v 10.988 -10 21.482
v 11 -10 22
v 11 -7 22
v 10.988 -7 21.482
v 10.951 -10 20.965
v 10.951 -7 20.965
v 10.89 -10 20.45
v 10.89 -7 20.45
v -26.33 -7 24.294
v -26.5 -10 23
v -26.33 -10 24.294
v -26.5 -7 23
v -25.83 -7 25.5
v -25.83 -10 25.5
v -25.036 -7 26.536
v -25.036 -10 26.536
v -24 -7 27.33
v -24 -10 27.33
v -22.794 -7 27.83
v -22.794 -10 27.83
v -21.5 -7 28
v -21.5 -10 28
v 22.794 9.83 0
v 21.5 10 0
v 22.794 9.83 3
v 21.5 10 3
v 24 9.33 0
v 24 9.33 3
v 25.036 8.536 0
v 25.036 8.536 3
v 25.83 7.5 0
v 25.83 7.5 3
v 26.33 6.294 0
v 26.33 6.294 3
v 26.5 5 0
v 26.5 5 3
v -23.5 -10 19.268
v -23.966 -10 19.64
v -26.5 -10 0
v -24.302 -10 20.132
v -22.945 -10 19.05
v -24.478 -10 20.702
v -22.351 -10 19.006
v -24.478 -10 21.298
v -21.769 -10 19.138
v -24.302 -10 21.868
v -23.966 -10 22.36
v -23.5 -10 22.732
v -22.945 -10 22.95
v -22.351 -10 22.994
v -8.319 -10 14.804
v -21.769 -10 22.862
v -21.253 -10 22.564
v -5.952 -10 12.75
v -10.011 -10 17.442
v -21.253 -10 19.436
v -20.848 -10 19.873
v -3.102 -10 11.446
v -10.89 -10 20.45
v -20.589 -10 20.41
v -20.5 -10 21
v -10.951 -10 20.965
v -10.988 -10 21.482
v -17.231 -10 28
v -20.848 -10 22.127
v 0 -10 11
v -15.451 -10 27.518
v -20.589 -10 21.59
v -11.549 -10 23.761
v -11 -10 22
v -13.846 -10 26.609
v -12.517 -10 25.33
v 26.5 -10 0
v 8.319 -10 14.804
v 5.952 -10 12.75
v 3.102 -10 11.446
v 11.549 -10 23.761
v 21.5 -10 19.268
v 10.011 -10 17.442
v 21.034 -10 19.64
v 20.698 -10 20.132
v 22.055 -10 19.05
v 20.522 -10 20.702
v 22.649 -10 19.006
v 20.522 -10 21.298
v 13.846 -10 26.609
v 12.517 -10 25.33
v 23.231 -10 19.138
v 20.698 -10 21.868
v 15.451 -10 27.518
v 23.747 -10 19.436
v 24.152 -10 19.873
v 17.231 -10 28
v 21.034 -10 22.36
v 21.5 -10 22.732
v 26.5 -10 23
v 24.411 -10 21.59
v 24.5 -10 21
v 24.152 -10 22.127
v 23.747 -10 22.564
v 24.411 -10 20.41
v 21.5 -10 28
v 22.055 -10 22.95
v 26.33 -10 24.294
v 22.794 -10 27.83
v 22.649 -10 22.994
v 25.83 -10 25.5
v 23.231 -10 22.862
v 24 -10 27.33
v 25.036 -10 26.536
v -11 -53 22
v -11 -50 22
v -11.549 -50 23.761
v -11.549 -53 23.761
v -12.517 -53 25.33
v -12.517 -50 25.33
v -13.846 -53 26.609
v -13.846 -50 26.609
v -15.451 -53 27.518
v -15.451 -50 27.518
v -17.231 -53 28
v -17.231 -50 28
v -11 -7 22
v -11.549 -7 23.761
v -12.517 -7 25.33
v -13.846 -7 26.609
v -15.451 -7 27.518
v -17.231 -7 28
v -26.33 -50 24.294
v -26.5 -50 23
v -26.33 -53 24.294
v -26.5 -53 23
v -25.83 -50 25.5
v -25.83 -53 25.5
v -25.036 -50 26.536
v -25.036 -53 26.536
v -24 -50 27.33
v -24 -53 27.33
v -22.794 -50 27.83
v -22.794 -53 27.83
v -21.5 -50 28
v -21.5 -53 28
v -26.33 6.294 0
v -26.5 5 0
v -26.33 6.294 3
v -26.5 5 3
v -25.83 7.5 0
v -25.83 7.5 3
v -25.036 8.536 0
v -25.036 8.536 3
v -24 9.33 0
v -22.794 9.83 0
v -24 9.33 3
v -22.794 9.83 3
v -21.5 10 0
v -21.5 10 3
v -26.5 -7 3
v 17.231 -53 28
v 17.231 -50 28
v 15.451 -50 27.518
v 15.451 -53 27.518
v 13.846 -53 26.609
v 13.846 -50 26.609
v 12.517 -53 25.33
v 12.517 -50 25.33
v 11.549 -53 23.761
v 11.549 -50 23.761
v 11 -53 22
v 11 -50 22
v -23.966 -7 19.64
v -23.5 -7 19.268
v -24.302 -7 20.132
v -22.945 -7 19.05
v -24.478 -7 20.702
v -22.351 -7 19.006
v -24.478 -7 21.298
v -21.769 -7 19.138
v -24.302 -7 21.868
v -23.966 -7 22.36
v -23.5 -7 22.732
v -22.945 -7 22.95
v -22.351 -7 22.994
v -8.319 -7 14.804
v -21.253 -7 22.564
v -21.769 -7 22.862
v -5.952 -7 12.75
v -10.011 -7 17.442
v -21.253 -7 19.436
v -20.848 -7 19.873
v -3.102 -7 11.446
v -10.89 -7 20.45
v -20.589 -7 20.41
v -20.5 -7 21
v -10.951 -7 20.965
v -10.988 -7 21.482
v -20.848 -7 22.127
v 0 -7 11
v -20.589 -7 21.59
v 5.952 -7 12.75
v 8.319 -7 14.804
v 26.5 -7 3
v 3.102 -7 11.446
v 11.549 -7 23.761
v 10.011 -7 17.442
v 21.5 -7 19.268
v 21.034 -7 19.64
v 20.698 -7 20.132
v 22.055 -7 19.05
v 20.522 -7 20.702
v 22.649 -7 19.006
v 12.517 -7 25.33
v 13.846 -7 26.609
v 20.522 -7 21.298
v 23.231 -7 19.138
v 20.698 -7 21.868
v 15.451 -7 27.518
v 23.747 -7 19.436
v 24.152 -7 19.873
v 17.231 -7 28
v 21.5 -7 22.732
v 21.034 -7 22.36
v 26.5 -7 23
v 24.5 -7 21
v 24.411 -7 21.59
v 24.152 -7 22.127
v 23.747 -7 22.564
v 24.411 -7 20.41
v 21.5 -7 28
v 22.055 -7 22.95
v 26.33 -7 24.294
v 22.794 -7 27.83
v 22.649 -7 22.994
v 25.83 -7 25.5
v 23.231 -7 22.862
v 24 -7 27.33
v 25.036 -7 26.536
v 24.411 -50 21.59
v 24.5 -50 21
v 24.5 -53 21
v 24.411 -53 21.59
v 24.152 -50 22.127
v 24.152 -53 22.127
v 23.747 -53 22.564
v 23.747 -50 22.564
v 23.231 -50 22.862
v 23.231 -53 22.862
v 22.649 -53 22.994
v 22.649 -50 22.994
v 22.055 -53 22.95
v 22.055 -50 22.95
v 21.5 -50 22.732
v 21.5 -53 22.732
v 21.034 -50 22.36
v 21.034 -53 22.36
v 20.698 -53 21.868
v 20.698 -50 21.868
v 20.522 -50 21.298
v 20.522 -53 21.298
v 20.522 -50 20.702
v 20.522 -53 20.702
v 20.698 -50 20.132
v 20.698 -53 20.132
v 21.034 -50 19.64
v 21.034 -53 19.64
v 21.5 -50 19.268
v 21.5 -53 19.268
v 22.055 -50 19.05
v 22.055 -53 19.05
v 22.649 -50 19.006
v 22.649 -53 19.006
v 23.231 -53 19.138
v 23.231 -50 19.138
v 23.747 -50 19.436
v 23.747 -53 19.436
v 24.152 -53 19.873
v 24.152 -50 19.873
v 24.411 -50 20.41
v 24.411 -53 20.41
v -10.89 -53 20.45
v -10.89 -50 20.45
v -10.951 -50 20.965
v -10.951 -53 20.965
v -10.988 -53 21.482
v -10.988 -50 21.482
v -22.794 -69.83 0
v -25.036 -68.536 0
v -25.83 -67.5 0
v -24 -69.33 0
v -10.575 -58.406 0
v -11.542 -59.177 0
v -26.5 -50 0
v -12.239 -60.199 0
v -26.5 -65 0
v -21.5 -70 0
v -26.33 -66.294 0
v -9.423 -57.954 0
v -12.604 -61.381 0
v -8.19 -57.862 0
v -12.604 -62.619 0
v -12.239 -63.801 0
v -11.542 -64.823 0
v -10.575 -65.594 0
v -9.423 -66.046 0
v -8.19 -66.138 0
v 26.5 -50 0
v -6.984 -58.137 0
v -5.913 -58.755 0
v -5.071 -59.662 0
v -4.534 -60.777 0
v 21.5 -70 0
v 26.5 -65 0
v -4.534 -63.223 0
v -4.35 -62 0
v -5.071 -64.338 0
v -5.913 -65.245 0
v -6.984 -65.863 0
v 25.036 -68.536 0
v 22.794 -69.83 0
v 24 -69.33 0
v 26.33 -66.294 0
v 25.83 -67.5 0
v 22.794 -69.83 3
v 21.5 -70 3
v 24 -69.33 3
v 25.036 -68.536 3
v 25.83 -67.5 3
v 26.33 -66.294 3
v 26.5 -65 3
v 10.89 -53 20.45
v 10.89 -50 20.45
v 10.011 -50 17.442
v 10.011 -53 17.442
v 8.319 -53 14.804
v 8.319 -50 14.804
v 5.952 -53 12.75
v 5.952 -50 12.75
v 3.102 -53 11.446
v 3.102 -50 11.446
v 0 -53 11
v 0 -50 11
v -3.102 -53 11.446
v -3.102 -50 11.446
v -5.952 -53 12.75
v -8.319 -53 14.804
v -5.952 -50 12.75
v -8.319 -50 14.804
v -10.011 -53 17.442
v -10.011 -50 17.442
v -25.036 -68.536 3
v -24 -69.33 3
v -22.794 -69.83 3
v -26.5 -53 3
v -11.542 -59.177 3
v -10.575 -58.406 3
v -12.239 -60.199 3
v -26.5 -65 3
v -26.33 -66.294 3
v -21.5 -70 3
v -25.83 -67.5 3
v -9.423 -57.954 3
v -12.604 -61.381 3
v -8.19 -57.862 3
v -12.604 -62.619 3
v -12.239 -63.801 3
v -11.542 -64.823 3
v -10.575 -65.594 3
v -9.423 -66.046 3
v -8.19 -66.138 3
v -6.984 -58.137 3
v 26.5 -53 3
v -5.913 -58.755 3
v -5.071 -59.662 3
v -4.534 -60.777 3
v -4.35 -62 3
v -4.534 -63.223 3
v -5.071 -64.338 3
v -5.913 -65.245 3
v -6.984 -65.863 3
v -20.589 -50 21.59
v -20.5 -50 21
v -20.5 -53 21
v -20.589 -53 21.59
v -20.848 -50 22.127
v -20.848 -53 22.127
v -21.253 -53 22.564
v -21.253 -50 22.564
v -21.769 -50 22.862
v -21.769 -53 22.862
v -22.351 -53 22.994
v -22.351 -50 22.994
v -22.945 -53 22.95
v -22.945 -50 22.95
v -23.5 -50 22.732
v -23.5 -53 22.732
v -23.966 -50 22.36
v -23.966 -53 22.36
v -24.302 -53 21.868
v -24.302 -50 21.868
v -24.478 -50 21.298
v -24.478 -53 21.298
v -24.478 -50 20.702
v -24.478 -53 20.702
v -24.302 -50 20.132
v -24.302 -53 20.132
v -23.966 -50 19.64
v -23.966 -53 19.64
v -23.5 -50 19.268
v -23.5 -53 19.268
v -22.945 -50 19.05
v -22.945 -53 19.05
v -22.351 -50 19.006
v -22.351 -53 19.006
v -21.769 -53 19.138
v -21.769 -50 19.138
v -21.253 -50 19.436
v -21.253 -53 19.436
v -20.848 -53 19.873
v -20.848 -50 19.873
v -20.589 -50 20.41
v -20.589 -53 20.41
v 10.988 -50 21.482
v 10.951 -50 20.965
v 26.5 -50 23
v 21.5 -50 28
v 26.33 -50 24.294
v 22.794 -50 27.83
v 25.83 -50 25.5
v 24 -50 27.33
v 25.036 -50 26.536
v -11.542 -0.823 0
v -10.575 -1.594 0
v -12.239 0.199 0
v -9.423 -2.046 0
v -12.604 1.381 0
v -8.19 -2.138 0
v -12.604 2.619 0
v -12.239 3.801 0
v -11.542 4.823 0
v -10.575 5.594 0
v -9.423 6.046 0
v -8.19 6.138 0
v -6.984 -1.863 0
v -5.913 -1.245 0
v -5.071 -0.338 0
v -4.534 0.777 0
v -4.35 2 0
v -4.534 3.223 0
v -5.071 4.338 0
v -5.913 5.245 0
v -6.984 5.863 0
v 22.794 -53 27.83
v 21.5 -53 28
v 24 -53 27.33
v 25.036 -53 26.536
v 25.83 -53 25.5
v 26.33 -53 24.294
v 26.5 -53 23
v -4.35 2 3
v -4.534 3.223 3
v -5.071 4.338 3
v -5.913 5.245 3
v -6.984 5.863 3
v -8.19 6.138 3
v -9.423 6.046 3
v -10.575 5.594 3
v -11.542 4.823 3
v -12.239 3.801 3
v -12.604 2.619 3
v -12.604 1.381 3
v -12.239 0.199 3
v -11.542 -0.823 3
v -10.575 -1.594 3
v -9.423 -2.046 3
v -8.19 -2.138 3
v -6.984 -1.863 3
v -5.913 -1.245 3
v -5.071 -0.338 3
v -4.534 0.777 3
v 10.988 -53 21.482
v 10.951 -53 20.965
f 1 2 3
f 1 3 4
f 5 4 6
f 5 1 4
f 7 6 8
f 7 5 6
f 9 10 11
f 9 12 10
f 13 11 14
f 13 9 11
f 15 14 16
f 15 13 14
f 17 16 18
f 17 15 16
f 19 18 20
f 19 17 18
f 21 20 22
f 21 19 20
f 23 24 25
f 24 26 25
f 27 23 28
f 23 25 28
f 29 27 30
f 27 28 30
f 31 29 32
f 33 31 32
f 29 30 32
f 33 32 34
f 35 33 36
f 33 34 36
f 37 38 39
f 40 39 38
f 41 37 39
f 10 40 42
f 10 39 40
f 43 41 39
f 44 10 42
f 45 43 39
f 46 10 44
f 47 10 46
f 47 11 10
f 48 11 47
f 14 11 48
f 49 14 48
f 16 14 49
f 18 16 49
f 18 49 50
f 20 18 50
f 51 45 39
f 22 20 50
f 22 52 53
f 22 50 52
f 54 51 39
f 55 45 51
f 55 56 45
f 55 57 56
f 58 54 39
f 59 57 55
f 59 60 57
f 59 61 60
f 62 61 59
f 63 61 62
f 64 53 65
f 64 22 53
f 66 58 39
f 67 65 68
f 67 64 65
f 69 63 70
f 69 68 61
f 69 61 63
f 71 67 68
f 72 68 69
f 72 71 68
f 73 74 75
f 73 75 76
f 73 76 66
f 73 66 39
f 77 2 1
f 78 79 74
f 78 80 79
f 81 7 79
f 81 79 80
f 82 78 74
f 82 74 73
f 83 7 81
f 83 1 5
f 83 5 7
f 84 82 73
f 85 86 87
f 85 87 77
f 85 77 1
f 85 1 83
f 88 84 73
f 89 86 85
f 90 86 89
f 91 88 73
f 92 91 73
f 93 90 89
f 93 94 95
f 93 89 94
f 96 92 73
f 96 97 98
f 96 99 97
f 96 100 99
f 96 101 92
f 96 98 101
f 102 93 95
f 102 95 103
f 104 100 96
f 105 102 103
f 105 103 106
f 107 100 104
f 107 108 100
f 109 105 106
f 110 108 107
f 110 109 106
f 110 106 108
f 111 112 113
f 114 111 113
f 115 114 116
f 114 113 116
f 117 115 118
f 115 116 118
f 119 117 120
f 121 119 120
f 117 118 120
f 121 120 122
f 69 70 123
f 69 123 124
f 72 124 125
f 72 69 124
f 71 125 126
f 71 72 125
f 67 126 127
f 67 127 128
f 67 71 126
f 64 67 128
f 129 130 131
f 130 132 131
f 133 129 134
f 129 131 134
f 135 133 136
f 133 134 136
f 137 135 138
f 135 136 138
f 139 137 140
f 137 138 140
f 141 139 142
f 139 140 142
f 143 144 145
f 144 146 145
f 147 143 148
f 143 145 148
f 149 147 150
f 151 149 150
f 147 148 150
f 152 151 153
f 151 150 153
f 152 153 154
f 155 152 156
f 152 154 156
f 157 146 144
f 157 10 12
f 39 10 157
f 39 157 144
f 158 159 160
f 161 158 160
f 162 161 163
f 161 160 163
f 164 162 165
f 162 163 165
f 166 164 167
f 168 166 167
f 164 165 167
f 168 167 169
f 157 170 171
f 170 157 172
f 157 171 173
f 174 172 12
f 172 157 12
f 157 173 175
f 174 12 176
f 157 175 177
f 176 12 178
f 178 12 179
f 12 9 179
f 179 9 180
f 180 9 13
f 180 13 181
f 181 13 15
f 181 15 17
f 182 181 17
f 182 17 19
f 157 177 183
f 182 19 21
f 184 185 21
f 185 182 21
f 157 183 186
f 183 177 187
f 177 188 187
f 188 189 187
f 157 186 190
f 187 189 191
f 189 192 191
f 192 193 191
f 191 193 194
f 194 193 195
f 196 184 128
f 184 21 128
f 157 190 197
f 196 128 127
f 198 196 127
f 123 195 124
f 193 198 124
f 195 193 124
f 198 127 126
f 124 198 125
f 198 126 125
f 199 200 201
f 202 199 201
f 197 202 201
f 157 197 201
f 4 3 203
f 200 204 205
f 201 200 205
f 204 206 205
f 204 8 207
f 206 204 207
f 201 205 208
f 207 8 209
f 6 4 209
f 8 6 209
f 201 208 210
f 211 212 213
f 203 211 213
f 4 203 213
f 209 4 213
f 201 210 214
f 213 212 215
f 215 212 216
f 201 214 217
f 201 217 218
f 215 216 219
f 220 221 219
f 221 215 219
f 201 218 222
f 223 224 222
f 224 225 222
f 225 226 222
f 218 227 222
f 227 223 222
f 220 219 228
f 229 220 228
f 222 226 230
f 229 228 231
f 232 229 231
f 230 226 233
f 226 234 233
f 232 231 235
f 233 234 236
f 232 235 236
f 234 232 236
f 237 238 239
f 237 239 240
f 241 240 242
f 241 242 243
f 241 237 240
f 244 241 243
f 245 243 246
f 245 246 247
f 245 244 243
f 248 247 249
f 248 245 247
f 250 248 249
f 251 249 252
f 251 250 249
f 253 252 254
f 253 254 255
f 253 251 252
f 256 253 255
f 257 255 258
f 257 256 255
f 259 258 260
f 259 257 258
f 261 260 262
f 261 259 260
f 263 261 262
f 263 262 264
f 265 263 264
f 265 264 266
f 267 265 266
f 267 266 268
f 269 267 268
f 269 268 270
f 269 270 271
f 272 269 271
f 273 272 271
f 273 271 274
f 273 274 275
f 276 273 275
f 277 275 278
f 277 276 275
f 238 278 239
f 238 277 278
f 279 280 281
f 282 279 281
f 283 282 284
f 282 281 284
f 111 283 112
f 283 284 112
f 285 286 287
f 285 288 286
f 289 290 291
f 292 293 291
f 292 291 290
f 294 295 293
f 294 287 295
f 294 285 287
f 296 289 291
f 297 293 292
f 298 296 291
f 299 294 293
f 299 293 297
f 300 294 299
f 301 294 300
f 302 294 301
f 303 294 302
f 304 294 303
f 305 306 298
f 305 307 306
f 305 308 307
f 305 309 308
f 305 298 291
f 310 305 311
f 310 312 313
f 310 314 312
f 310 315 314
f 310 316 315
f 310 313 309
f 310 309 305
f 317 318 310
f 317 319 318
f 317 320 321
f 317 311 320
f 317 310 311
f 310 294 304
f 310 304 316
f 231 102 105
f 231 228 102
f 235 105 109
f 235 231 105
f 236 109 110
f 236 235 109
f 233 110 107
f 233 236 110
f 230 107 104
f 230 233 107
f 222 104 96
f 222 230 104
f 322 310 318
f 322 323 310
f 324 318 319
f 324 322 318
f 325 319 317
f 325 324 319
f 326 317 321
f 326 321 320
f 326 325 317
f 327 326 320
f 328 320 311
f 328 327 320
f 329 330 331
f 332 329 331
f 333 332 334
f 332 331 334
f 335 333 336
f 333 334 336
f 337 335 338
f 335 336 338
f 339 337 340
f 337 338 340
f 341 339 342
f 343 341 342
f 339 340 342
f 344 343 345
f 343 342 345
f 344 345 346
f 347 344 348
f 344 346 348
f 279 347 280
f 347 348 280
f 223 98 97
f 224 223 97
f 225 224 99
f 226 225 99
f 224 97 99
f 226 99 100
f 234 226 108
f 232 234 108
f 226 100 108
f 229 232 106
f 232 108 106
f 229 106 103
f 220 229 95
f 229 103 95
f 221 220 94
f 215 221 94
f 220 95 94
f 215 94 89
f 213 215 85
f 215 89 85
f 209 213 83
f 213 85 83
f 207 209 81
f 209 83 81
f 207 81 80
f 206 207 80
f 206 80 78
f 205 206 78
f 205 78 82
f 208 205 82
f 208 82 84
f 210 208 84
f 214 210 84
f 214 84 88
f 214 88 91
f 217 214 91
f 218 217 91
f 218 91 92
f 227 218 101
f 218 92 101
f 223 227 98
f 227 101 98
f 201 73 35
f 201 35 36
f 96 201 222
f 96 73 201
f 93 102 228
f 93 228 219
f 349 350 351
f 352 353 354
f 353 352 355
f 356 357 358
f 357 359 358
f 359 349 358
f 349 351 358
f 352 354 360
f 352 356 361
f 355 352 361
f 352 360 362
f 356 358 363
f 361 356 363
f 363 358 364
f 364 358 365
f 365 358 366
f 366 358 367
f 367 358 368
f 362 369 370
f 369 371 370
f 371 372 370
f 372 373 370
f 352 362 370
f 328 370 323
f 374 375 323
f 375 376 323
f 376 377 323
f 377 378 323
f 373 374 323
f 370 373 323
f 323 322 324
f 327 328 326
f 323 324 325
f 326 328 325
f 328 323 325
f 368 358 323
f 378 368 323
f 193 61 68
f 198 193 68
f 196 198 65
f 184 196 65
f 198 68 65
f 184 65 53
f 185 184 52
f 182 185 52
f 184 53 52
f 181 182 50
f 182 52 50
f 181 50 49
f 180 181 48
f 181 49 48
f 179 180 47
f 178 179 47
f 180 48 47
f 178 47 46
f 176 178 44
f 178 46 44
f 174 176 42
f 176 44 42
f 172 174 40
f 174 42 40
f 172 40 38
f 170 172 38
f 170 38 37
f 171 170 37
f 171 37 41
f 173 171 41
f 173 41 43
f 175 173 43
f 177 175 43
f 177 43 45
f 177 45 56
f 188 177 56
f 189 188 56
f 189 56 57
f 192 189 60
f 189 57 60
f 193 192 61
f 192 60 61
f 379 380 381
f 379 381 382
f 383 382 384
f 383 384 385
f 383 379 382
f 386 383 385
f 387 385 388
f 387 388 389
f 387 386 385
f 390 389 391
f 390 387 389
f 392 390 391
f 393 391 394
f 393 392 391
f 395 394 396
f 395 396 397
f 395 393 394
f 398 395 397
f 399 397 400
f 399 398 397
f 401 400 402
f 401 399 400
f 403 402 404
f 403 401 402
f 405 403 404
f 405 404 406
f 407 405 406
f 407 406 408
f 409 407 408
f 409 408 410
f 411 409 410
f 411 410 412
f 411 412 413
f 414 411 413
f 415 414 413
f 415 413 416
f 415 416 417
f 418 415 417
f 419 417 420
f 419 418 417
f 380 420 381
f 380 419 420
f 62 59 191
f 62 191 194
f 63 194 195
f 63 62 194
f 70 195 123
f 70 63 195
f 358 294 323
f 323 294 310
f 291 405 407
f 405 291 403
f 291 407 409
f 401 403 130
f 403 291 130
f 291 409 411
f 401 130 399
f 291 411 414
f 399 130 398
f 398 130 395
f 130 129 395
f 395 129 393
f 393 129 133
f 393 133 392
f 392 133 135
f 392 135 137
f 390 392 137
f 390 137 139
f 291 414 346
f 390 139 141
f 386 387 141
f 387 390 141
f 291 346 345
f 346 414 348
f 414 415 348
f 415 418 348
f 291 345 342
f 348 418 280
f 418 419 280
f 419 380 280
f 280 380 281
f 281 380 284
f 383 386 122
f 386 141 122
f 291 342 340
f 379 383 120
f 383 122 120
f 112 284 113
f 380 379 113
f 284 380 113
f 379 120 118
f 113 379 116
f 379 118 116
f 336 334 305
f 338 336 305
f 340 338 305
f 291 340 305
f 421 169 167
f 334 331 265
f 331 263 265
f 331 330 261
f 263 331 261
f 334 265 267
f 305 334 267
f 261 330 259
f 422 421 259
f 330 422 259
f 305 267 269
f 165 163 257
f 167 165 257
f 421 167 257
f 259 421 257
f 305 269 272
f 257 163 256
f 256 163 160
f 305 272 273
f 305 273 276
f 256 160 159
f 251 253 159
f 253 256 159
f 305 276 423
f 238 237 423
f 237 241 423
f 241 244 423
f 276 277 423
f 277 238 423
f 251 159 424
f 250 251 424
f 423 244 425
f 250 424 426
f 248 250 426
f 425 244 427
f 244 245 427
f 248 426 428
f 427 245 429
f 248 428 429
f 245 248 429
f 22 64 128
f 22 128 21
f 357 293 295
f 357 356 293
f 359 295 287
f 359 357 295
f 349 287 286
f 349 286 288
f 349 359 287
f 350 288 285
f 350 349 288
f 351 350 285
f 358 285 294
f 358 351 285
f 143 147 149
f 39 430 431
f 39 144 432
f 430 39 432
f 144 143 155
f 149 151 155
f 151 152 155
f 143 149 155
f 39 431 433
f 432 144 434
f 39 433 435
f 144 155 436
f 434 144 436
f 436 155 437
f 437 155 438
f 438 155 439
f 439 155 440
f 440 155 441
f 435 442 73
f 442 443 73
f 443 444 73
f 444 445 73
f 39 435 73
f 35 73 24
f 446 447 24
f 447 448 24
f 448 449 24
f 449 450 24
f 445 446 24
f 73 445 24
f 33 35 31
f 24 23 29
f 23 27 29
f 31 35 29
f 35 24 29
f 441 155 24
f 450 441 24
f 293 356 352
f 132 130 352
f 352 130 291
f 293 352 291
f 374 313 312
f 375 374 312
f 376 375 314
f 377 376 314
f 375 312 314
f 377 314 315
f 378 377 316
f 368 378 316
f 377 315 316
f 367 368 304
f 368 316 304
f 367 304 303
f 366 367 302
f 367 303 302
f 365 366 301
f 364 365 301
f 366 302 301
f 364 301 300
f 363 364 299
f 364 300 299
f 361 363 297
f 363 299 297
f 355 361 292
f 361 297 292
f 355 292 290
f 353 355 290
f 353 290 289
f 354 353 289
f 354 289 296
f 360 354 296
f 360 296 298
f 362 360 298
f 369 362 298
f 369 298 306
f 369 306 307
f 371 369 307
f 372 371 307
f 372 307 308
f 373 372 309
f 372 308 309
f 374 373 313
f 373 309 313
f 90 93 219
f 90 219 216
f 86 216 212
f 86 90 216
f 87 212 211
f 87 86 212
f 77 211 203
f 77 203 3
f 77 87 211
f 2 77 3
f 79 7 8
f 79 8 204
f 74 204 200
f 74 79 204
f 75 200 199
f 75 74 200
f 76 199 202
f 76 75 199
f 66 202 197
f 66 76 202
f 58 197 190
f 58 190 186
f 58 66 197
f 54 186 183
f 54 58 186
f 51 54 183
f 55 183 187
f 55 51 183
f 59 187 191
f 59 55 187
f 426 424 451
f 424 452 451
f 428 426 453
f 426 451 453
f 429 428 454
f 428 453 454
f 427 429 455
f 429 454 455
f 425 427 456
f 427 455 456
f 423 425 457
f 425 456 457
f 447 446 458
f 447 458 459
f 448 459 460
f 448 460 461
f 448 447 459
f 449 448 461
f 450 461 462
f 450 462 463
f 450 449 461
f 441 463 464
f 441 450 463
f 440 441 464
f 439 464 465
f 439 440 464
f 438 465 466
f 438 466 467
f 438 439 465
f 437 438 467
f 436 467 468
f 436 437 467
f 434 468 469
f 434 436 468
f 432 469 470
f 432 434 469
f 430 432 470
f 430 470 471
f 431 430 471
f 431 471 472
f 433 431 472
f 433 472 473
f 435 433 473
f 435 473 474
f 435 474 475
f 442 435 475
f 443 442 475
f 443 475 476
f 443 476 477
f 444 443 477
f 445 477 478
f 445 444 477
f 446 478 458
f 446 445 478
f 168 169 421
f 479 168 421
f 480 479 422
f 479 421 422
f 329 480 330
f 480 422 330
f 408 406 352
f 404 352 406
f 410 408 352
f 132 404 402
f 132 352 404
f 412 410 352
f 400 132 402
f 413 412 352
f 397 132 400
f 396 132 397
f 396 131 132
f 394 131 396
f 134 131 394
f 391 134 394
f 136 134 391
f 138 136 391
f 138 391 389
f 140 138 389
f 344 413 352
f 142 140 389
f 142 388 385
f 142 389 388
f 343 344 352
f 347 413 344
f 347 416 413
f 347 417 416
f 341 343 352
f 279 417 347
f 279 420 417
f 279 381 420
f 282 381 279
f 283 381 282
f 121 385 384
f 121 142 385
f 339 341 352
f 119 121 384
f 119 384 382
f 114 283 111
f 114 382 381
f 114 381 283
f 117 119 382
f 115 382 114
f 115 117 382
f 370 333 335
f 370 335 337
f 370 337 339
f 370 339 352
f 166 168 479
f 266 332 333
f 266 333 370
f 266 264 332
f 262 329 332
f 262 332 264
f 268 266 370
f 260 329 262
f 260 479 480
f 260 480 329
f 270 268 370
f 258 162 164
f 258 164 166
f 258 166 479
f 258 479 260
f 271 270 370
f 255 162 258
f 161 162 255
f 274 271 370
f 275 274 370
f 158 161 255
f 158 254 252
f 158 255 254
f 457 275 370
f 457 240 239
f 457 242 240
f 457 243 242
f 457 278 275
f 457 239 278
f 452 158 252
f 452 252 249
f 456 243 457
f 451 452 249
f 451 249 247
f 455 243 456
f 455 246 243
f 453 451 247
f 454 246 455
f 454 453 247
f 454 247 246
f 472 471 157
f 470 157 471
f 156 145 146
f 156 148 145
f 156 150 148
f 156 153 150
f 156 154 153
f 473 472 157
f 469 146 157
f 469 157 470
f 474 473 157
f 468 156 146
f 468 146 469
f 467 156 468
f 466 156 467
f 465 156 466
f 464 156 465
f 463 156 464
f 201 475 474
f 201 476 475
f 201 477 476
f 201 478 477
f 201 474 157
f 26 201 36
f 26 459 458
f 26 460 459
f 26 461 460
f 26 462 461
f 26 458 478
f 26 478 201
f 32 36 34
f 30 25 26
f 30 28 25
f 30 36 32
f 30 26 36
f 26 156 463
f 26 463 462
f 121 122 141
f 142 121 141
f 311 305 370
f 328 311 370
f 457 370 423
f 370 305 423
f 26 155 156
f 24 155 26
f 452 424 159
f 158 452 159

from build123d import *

# Parameters (mm, degrees)
F0_W     = 53
F0_H     = 20
F0_R     = 4.15
F1_DEPTH = 3
F2_R     = 5
F3_R     = 2
F4_DEPTH = 3
F5_R     = 5


with BuildPart() as f1:
    # F0 (on Top) → F1 (new body)
    with BuildSketch(Plane.XY):
        Rectangle(F0_W, F0_H)
        with Locations((-8.5, 2)):
            Circle(F0_R, mode=Mode.SUBTRACT)
    extrude(amount=F1_DEPTH)

    # F2
    f2_edges = [f1.edges().sort_by_distance(p)[0] for p in [
        (-26.5, 10, 1.5),
        (26.5, 10, 1.5),
    ]]
    fillet(f2_edges, radius=F2_R)

    # F3 (on face) → F4 (join)
    with BuildSketch(Plane.XZ.offset(10)):
        with BuildLine():
            Line((-26.5, 28), (-26.5, 3))
            Line((-26.5, 3), (26.5, 3))
            Line((26.5, 3), (26.5, 28))
            Line((26.5, 28), (19.266637, 28))
            Line((19.266637, 28), (17.230766, 28))
            ThreePointArc((17.230766, 28), (13.14142, 26.011422), (11, 22))
            ThreePointArc((11, 22), (10.972522, 21.222976), (10.890224, 20.449834))
            ThreePointArc((10.890224, 20.449834), (0, 11), (-10.890224, 20.449834))
            ThreePointArc((-10.890224, 20.449834), (-10.972522, 21.222976), (-11, 22))
            ThreePointArc((-11, 22), (-13.14142, 26.011422), (-17.230766, 28))
            Line((-17.230766, 28), (-19.266637, 28))
            Line((-19.266637, 28), (-26.5, 28))
        make_face()
        with Locations((-22.5, 21)):
            Circle(F3_R, mode=Mode.SUBTRACT)
        with Locations((22.5, 21)):
            Circle(F3_R, mode=Mode.SUBTRACT)
    extrude(amount=-F4_DEPTH)

    # F5
    f5_edges = [f1.edges().sort_by_distance(p)[0] for p in [
        (-26.5, -8.5, 28),
        (26.5, -8.5, 28),
    ]]
    fillet(f5_edges, radius=F5_R)


with BuildPart() as f7_1:
    # F7: instance of F1
    add(f1.part.mirror(Plane.XZ.offset(30)))


solid = Compound([f1.part, f7_1.part])
